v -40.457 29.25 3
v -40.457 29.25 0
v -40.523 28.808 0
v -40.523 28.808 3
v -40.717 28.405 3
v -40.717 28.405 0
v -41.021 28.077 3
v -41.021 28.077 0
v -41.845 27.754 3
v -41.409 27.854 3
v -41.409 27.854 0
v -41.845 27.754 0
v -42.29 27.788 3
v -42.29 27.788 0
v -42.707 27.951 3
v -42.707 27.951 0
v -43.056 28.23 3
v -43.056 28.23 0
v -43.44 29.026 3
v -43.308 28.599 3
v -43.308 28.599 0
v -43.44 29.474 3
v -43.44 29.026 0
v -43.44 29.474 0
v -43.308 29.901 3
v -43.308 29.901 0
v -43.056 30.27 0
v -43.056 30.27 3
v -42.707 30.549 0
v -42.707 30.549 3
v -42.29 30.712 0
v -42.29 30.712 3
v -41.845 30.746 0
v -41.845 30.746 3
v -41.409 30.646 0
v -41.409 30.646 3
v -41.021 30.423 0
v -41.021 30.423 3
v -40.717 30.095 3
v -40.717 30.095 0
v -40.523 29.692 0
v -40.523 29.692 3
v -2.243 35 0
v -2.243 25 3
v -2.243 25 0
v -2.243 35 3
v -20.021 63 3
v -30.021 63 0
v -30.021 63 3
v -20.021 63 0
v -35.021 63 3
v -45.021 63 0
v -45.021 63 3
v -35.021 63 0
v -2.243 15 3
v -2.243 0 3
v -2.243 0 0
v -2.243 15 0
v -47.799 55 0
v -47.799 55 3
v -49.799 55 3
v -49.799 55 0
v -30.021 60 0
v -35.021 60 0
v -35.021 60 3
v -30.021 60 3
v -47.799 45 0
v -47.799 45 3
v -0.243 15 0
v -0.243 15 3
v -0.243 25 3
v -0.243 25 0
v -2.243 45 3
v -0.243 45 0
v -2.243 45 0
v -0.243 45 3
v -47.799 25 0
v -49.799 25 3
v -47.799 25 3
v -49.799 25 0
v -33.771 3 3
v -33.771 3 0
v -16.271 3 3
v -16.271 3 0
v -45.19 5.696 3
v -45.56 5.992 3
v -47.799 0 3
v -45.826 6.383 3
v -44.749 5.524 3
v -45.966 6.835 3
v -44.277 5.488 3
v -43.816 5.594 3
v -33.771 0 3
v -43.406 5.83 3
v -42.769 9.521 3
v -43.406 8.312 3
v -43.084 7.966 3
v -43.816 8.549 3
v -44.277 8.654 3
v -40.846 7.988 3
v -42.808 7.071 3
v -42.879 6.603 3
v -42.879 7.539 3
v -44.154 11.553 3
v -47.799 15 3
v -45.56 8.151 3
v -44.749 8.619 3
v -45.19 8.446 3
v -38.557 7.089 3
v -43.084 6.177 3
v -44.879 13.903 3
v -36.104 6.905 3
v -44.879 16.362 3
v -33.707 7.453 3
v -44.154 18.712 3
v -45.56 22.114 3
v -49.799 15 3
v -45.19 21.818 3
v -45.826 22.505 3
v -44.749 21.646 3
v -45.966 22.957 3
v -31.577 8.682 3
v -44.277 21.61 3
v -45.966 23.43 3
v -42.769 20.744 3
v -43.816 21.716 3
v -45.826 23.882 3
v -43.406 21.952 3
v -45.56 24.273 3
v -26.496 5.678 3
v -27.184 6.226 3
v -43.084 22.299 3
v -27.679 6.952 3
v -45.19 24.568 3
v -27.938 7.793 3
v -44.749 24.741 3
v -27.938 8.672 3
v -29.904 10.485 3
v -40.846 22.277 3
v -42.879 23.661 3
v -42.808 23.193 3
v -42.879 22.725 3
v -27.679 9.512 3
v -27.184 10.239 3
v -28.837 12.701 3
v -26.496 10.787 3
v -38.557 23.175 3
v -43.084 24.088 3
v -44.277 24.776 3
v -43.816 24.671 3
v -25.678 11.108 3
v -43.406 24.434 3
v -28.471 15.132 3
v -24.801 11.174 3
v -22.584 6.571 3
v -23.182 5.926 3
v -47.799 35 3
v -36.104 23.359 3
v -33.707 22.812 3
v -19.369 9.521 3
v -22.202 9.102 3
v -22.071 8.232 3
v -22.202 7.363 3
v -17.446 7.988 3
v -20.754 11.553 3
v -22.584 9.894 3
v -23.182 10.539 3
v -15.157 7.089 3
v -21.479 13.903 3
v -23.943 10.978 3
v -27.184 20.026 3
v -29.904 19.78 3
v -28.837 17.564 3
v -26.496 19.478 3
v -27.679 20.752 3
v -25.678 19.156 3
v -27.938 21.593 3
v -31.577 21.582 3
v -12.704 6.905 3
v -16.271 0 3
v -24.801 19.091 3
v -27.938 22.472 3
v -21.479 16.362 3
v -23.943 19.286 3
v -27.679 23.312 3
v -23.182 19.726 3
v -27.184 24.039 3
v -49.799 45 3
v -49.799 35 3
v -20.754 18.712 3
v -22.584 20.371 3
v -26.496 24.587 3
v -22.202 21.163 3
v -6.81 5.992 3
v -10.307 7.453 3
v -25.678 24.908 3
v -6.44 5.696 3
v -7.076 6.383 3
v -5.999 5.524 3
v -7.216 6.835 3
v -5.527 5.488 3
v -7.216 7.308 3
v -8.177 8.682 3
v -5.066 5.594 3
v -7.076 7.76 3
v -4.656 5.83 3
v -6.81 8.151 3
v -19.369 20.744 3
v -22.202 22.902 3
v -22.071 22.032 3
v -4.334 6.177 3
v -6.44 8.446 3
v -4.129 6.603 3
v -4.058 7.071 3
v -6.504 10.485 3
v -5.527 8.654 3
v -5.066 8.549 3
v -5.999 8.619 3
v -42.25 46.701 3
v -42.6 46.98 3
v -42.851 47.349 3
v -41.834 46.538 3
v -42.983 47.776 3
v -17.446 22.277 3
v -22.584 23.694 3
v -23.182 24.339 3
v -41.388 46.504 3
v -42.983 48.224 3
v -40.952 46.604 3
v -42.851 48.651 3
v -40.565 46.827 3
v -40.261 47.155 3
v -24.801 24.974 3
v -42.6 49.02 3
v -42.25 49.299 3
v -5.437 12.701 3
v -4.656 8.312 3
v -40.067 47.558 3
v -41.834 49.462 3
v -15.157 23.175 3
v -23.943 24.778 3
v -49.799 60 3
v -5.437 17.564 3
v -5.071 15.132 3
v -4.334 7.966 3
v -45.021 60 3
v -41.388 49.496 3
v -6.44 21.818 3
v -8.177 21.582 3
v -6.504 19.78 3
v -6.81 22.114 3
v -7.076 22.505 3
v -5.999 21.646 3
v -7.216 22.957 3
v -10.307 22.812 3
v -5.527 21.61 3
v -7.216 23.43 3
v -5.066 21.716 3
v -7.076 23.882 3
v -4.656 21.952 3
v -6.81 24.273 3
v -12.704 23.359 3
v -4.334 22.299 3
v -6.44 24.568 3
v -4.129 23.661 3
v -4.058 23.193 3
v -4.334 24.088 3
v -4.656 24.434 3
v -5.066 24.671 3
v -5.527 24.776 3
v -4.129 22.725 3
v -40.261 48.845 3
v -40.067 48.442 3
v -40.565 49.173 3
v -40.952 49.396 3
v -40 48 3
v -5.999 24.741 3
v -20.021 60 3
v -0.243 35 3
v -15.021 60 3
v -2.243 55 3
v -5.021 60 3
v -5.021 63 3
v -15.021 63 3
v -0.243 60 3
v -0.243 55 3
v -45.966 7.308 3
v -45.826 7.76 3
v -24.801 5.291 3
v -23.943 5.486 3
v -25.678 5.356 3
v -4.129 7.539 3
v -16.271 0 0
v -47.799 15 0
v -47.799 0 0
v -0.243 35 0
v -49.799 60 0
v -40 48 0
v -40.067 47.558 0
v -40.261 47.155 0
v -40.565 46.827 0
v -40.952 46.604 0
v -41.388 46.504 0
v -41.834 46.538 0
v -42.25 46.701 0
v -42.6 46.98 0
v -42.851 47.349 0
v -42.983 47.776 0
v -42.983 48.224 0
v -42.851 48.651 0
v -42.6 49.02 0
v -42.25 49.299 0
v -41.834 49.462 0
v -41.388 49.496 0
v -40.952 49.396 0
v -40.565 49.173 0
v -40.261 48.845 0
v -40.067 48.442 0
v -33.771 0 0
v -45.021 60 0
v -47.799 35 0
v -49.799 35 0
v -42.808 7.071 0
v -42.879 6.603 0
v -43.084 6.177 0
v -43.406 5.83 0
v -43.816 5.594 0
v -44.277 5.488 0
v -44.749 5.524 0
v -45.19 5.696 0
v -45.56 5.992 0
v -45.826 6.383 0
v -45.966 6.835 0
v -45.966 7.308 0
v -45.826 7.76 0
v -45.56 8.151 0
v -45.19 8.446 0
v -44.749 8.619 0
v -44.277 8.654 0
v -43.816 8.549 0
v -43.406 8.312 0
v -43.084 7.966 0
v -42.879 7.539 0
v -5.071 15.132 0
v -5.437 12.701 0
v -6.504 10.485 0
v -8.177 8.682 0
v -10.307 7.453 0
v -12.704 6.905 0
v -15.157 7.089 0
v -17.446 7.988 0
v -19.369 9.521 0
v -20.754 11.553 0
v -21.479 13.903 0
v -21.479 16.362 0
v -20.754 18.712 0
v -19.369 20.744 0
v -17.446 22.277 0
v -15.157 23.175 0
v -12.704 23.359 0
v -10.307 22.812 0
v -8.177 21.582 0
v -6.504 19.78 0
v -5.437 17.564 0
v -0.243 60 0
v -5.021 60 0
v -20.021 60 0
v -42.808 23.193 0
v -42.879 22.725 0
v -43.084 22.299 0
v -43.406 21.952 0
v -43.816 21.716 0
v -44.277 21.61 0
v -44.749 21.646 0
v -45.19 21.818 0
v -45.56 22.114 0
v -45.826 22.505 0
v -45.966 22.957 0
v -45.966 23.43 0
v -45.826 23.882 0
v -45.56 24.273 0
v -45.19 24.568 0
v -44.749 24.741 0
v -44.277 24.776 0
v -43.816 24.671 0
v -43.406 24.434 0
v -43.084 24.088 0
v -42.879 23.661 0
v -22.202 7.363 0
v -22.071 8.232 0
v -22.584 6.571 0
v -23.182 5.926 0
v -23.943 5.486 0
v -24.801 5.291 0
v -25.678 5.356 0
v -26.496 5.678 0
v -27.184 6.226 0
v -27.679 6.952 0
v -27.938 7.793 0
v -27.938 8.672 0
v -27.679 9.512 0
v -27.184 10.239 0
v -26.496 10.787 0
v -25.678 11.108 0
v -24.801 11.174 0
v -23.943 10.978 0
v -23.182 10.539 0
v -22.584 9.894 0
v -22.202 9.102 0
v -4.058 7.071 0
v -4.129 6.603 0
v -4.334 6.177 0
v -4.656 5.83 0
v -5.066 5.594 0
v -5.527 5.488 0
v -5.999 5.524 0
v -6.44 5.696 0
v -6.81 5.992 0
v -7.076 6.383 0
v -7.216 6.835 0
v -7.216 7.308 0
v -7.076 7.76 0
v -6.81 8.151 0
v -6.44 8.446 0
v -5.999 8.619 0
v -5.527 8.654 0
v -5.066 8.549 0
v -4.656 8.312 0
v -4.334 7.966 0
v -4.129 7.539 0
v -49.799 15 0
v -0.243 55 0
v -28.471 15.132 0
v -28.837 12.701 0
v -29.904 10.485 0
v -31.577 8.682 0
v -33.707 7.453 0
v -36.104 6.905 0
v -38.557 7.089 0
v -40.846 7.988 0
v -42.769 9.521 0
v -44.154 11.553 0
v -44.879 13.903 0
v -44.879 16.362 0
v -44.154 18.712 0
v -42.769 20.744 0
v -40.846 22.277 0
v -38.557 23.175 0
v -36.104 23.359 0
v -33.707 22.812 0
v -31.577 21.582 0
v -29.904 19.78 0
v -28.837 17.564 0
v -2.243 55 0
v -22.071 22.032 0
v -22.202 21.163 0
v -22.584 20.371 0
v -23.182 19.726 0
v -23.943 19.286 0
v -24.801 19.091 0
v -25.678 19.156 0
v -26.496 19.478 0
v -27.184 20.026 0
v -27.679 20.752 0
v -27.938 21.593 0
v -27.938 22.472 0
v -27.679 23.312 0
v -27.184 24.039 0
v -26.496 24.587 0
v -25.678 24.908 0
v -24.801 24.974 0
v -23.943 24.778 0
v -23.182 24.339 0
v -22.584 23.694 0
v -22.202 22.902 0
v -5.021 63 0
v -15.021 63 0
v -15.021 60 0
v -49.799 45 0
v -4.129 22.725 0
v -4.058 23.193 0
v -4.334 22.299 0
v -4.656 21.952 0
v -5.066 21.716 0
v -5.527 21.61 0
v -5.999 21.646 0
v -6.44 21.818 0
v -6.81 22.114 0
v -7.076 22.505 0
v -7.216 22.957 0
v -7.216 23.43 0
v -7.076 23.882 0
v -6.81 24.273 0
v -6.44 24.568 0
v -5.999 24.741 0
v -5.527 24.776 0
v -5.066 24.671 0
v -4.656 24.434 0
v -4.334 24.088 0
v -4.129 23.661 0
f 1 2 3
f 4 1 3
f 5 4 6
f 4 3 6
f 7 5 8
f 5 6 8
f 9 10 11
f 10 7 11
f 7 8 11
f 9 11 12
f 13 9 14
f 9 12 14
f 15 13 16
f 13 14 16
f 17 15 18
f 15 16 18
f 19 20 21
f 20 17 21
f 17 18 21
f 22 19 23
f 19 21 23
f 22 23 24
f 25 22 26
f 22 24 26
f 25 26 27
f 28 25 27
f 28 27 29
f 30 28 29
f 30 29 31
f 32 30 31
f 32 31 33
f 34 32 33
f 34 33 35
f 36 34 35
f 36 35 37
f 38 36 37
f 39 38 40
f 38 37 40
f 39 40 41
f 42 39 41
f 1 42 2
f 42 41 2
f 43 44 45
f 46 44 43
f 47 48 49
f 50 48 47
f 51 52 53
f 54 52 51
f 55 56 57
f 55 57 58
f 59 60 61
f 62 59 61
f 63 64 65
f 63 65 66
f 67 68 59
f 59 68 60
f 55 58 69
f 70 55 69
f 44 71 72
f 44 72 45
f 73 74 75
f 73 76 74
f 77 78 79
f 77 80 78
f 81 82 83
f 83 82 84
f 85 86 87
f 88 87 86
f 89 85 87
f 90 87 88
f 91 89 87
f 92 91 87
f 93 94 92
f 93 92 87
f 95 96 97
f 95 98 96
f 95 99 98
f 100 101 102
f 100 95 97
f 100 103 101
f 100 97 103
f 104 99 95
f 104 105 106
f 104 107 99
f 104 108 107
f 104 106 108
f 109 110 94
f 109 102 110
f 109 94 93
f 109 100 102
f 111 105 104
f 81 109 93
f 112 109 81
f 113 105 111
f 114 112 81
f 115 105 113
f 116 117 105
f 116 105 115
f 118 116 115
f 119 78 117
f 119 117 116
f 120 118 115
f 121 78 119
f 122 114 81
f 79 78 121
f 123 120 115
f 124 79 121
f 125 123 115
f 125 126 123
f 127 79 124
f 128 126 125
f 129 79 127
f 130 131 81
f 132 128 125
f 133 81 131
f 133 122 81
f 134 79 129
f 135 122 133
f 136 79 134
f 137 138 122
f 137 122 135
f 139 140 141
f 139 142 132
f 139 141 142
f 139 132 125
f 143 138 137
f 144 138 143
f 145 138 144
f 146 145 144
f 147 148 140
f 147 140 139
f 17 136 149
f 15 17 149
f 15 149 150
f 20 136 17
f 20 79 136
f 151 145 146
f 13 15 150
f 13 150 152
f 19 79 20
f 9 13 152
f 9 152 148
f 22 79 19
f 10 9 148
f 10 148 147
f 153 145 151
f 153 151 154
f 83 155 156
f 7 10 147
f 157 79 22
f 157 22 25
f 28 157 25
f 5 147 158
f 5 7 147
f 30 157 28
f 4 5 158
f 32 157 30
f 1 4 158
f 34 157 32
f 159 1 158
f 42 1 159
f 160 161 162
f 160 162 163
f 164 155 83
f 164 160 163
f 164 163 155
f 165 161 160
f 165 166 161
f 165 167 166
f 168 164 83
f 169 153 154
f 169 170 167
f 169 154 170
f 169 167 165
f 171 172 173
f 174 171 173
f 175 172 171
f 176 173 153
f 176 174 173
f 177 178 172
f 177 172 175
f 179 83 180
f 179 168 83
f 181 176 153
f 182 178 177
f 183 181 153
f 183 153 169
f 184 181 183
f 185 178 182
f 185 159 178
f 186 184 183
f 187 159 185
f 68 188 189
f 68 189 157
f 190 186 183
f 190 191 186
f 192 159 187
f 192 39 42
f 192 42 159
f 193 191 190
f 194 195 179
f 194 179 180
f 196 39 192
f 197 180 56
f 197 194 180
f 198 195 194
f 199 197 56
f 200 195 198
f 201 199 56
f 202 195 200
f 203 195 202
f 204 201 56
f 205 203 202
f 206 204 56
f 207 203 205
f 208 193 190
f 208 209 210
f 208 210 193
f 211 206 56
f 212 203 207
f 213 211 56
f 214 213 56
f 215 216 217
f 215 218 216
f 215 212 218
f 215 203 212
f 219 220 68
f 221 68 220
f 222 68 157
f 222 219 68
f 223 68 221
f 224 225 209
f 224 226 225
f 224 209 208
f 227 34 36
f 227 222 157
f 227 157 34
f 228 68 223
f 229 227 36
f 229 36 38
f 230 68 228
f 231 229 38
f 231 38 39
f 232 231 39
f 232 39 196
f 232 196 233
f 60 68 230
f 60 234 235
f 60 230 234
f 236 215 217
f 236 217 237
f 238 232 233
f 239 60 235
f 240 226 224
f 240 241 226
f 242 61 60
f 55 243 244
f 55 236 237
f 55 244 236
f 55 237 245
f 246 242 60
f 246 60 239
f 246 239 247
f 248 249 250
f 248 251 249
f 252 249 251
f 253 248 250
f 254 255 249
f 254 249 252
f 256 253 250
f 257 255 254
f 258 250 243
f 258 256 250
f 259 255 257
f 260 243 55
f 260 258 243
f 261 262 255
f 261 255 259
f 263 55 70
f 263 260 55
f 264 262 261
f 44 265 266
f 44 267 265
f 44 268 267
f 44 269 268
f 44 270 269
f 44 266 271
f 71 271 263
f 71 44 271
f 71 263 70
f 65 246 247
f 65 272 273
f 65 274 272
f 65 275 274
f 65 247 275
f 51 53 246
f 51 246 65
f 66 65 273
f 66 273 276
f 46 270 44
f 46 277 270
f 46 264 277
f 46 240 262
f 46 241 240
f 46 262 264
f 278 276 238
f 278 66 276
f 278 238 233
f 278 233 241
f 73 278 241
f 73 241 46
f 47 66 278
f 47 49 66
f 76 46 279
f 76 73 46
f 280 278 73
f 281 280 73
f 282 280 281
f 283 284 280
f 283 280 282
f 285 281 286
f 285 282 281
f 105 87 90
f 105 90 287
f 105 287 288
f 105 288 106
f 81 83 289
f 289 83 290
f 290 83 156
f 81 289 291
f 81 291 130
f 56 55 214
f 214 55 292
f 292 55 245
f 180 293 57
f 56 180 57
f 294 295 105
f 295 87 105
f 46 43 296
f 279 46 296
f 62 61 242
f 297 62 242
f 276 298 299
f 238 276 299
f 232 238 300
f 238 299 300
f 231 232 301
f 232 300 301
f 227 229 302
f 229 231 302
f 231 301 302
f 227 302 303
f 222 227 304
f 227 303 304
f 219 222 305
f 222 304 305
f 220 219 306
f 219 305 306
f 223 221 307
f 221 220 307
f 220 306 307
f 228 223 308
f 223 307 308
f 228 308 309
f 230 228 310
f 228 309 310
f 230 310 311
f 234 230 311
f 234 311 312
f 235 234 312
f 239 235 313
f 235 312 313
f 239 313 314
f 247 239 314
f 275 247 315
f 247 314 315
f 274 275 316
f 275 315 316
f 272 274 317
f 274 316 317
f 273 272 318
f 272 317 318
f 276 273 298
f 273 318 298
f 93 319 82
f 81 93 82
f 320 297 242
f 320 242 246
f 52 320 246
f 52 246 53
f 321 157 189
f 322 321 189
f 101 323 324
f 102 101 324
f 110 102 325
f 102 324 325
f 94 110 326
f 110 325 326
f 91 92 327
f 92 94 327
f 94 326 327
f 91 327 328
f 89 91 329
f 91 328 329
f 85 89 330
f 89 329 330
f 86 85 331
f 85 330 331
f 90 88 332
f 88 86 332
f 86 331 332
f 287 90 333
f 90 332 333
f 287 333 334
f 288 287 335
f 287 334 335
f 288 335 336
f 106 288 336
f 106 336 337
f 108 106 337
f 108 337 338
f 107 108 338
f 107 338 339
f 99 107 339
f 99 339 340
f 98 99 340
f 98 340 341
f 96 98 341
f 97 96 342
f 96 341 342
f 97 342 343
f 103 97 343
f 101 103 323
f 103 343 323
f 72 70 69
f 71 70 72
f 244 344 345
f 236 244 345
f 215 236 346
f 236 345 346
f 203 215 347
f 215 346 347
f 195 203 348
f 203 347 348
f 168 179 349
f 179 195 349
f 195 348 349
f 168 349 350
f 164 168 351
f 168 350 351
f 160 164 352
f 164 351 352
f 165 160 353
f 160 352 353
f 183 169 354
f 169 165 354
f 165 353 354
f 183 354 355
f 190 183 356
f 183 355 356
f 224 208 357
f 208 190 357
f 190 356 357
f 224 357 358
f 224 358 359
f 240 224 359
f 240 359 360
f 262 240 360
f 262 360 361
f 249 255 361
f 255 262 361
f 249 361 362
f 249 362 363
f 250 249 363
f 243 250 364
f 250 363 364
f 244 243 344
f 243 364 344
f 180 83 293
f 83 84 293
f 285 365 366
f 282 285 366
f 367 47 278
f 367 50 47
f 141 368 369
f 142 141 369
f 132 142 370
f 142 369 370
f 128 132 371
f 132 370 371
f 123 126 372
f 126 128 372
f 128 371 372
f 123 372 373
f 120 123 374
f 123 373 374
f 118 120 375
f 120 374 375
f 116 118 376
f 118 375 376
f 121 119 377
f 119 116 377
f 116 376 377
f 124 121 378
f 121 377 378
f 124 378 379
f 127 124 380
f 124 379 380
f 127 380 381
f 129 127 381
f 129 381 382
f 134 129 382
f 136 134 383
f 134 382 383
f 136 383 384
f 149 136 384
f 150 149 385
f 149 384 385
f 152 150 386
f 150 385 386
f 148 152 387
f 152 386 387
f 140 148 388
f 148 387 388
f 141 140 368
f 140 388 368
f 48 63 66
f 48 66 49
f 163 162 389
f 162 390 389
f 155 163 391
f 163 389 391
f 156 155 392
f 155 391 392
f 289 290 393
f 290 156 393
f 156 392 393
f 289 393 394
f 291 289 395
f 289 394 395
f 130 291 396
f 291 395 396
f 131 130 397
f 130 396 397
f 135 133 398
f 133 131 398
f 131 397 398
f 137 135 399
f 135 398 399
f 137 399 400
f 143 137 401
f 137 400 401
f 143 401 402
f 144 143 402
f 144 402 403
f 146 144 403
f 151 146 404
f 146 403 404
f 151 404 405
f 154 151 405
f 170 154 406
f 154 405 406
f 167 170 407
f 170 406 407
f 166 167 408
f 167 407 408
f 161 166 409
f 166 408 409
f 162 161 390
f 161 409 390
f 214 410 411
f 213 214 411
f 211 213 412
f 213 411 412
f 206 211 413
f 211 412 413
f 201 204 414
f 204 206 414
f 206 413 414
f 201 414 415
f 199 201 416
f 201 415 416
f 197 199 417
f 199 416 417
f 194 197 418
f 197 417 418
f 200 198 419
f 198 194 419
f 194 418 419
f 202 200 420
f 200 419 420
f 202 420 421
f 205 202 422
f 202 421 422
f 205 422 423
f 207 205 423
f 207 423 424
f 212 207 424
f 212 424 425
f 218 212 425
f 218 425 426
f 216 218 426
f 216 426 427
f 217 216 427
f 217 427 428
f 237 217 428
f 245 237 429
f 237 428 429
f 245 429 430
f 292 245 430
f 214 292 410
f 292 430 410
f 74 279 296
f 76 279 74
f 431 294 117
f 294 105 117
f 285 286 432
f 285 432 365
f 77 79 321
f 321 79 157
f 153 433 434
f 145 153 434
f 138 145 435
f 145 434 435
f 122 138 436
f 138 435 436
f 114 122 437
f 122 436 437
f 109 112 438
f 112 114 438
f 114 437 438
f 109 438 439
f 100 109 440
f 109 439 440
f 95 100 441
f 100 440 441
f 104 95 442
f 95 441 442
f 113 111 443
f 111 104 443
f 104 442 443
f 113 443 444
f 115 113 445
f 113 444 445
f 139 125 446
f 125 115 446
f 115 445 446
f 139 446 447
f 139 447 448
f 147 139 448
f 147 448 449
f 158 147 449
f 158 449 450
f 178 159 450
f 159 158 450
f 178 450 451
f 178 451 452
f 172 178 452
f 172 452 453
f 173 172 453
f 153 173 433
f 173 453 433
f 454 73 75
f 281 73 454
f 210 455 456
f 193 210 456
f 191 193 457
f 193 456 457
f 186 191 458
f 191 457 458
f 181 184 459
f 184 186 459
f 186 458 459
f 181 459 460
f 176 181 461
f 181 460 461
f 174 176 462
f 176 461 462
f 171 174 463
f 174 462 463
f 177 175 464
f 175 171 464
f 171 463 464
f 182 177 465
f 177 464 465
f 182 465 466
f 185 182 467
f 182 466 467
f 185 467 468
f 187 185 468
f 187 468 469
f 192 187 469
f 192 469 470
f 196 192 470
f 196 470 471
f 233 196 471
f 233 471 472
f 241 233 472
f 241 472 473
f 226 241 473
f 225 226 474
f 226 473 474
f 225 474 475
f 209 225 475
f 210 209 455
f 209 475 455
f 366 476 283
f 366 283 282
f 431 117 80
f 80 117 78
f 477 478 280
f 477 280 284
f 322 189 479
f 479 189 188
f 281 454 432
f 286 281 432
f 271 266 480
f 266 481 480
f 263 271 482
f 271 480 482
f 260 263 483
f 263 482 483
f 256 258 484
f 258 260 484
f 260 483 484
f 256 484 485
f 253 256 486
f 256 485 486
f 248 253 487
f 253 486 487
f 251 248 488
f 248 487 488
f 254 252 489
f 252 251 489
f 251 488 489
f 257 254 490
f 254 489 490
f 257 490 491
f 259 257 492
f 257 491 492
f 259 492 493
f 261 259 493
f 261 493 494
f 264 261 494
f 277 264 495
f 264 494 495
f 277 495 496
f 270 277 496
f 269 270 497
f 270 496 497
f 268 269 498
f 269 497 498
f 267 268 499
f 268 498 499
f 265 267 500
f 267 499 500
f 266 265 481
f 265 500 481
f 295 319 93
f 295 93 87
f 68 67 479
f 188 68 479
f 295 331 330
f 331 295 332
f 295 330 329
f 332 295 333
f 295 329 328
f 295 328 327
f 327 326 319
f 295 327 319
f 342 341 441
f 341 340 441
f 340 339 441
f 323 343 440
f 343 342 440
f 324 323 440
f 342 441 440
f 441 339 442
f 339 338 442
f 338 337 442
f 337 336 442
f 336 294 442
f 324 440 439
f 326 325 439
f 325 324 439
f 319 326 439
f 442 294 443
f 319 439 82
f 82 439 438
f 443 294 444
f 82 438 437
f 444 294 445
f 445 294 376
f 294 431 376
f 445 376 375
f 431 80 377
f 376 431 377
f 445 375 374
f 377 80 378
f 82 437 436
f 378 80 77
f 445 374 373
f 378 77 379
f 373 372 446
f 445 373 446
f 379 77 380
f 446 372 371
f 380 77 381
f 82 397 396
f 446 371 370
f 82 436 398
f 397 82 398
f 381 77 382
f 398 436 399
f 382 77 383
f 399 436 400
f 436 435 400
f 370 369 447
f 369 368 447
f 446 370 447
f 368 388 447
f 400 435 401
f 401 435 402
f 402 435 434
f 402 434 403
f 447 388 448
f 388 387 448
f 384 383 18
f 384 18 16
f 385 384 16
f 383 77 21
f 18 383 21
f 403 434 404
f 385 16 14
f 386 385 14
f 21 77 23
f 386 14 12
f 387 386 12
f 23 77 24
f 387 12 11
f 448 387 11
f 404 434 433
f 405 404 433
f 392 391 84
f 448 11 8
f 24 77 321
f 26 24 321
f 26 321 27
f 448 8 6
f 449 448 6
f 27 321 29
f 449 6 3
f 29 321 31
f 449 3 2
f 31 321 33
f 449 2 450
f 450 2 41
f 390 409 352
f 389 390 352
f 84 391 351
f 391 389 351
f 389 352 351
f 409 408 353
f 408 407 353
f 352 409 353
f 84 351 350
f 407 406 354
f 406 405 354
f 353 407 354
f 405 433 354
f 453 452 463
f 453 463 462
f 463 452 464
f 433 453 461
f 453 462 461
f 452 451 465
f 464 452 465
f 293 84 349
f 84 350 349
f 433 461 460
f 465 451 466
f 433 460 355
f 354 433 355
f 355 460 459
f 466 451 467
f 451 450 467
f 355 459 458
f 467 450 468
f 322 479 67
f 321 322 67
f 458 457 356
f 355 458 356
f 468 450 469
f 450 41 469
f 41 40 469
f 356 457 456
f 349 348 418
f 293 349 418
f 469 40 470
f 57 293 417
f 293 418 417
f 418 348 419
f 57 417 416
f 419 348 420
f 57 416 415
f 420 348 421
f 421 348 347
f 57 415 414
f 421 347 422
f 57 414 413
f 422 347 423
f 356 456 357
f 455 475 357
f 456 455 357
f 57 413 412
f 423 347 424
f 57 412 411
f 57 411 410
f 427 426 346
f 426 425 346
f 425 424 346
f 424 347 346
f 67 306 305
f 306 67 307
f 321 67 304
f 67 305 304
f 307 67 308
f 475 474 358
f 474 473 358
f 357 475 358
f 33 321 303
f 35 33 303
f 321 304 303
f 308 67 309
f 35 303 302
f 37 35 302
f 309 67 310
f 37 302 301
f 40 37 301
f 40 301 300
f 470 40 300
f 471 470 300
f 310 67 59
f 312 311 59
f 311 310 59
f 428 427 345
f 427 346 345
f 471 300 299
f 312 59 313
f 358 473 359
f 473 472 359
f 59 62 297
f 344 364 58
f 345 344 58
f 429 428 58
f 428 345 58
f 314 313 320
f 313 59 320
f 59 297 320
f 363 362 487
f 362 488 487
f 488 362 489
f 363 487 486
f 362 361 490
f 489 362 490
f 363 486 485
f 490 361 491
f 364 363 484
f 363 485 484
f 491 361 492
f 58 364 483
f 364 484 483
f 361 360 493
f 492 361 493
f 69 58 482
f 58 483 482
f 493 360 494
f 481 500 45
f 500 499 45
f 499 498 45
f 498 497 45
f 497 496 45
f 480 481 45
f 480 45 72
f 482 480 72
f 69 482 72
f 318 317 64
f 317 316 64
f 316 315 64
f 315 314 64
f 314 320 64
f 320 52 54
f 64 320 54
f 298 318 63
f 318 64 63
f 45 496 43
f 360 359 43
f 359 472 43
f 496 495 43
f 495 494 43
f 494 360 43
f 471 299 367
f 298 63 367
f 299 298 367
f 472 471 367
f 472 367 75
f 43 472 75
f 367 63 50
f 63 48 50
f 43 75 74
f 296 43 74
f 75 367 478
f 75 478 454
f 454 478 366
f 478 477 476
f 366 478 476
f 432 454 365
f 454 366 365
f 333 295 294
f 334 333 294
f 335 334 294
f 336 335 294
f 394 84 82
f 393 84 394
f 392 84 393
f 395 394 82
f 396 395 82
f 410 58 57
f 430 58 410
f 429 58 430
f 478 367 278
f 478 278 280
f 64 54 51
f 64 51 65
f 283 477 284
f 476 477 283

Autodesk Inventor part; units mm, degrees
ref_plane "YZ Plane" through (0, 0, 0) normal (1, 0, 0) x (0, 1, 0)
ref_plane "XZ Plane" through (0, 0, 0) normal (0, 1, 0) x (-1, 0, 0)
ref_plane "XY Plane" through (0, 0, 0) normal (0, 0, 1) x (1, 0, 0)
sketch "Sketch1" plane through (0, 0, 0) normal (0, 0, 1) x (1, 0, 0)
  line L0 (-16.2709, 3) -> (-16.2709, 0)
  line L1 (-33.7709, 3) -> (-16.2709, 3)
  line L2 (-33.7709, 0) -> (-33.7709, 3)
  line L3 (-33.7709, 0) -> (-48.7992, 0)
  line L4 (-30.0209, 63) -> (-20.0209, 63)
  line L5 (-20.0209, 63) -> (-20.0209, 60)
  line L6 (-30.0209, 60) -> (-30.0209, 63)
  line L7 (-30.0209, 63) -> (-20.0209, 60) construction
  line L8 (-20.0209, 63) -> (-30.0209, 60) construction
  line L9 (-25.4776, 30) -> (-35.4566, 30) construction
  line L10 (-25.0209, 30) -> (-25.0209, 38) construction
  line L11 (-45.0209, 63) -> (-35.0209, 63)
  line L12 (-35.0209, 63) -> (-35.0209, 60)
  line L13 (-45.0209, 60) -> (-45.0209, 63)
  line L14 (-45.0209, 63) -> (-35.0209, 60) construction
  line L15 (-35.0209, 63) -> (-45.0209, 60) construction
  line L16 (-15.0209, 63) -> (-5.0209, 63)
  line L17 (-5.0209, 63) -> (-5.0209, 60)
  line L18 (-15.0209, 60) -> (-15.0209, 63)
  line L19 (-15.0209, 63) -> (-5.0209, 60) construction
  line L20 (-5.0209, 63) -> (-15.0209, 60) construction
  line L21 (-30.0209, 63) -> (-20.0209, 63)
  line L22 (-20.0209, 63) -> (-20.0209, 60)
  line L23 (-30.0209, 60) -> (-30.0209, 63)
  line L24 (-30.0209, 63) -> (-20.0209, 60) construction
  line L25 (-20.0209, 63) -> (-30.0209, 60) construction
  line L26 (-48.7992, 60) -> (-45.0209, 60)
  line L27 (-35.0209, 60) -> (-30.0209, 60)
  line L28 (-20.0209, 60) -> (-15.0209, 60)
  line L29 (-48.7992, 15) -> (-51.799, 15)
  line L30 (-51.799, 15) -> (-51.799, 25)
  line L31 (-51.799, 25) -> (-48.7992, 25)
  line L32 (-48.7992, 35) -> (-51.799, 35)
  line L33 (-51.799, 35) -> (-51.799, 45)
  line L34 (-48.7992, 45) -> (-51.799, 45)
  line L35 (-48.7992, 55) -> (-51.7992, 55)
  line L36 (-48.7992, 55) -> (-45.7992, 55) construction
  line L37 (-51.7992, 55) -> (-51.7992, 60)
  line L38 (-51.7992, 60) -> (-48.7992, 60)
  line L39 (-48.7992, 55) -> (-48.7992, 45)
  line L40 (-48.7992, 35) -> (-48.7992, 25)
  line L41 (-48.7992, 15) -> (-48.7992, 5)
  line L42 (-48.7992, 5) -> (-51.7992, 5)
  line L43 (-51.7992, 5) -> (-51.7992, 0)
  line L44 (-51.7992, 0) -> (-48.7992, 0)
  line L45 (-16.2709, 0) -> (-1.2426, 0)
  line L46 (-1.2426, 60) -> (-5.0209, 60)
  line L47 (-1.2426, 15) -> (1.7572, 15)
  line L48 (1.7572, 15) -> (1.7572, 25)
  line L49 (1.7572, 25) -> (-1.2426, 25)
  line L50 (-1.2426, 35) -> (1.7572, 35)
  line L51 (1.7572, 35) -> (1.7572, 45)
  line L52 (-1.2426, 45) -> (1.7572, 45)
  line L53 (-1.2426, 55) -> (1.7574, 55)
  line L54 (1.7574, 55) -> (1.7574, 60)
  line L55 (1.7574, 60) -> (-1.2426, 60)
  line L56 (-1.2426, 55) -> (-1.2426, 45)
  line L57 (-1.2426, 35) -> (-1.2426, 25)
  line L58 (-1.2426, 15) -> (-1.2426, 5)
  line L59 (-1.2426, 5) -> (1.7574, 5)
  line L60 (1.7574, 5) -> (1.7574, 0)
  line L61 (1.7574, 0) -> (-1.2426, 0)
  circle A0 centre (-44.3959, 23.1933) radius 1.5875
  circle A1 centre (-44.3959, 7.0713) radius 1.5875
  circle A2 centre (-36.7209, 15.1323) radius 8.25
  circle A3 centre (-25.0211, 22.0323) radius 2.95
  circle A4 centre (-25.0211, 8.2323) radius 2.95
  circle A5 centre (-13.3209, 15.1323) radius 8.25
  circle A6 centre (-5.6459, 7.0713) radius 1.5875
  circle A7 centre (-5.6459, 23.1933) radius 1.5875
  circle A8 centre (-41.9566, 29.25) radius 1.5
  circle A9 centre (-41.5, 48) radius 1.5
  line L62 (-5.6459, 7.0713) -> (-44.3959, 23.1933) construction
  line L63 (-44.3959, 23.1933) -> (-5.6459, 23.1933) construction
  line L64 (-5.6459, 23.1933) -> (-44.3959, 7.0713) construction
  point P0 (0, 0)
  point P1 (-25.0209, 61.5)
  point P2 (-40.0209, 61.5)
  point P3 (-10.0209, 61.5)
  point P4 (-25.0209, 61.5)
  point P5 (-48.7992, 30)
  point P6 (-1.2426, 30)
  point P7 (-25.4776, 15.3162)
  point P8 (-25.4776, 15.3162)
  point P9 (-25.4776, 15.3162)
  point P10 (-25.4776, 15.3162)
  point P11 (-25.0209, 3)
  point P12 (-25.0209, 15.1323)
  dimension "d0" = 10
  dimension "d1" = 3
  dimension "d4" = 15
  dimension "d7" = 15
  dimension "d13" = 3
  dimension "d14" = 180
  dimension "d15" = 3
  dimension "d17" = 7.675
  dimension "d18" = 7.675
  dimension "d23" = 2.9998
  dimension "d30" = 11.7002
  dimension "d31" = 11.6998
  dimension "d32" = 7.675
  dimension "d33" = 7.675
  dimension "d34" = 11.6998
  dimension "d35" = 11.7002
  dimension "d45" = 8.061
  dimension "d46" = 8.061
extrude "Extrusion2" add sketch "Sketch1" along normal blind 3
sketch "Sketch2" plane through (0, 0, 3) normal (0, 0, 1) x (1, 0, 0)
  line L0 (-1.2426, 5) -> (-1.2426, 15) projected
  line L1 (-1.2426, 25) -> (-1.2426, 35) projected
  line L2 (-1.2426, 45) -> (-1.2426, 55) projected
  line L3 (-48.7992, 55) -> (-48.7992, 45) projected
  line L4 (-48.7992, 35) -> (-48.7992, 25) projected
  line L5 (-48.7992, 15) -> (-48.7992, 5) projected
  line L6 (-1.2426, 5) -> (-2.2426, 5)
  line L7 (-2.2426, 5) -> (-2.2426, 15)
  line L8 (-2.2426, 15) -> (-1.2426, 15)
  line L9 (-1.2426, 25) -> (-2.2426, 25)
  line L10 (-2.2426, 25) -> (-2.2426, 35)
  line L11 (-2.2426, 35) -> (-1.2426, 35)
  line L12 (-1.2426, 45) -> (-2.2426, 45)
  line L13 (-2.2426, 45) -> (-2.2426, 55)
  line L14 (-2.2426, 55) -> (-1.2426, 55)
  line L15 (-48.7992, 5) -> (-47.7992, 5)
  line L16 (-47.7992, 5) -> (-47.7992, 15)
  line L17 (-47.7992, 15) -> (-48.7992, 15)
  line L18 (-48.7992, 25) -> (-47.7992, 25)
  line L19 (-47.7992, 25) -> (-47.7992, 35)
  line L20 (-47.7992, 35) -> (-48.7992, 35)
  line L21 (-48.7992, 45) -> (-47.7992, 45)
  line L22 (-48.7992, 45) -> (-51.799, 45) projected
  line L23 (-47.7992, 45) -> (-47.7992, 55)
  line L24 (-47.7992, 55) -> (-48.7992, 55)
  point P0 (0, 0)
  dimension "d24" = 1
  dimension "d25" = 1
  dimension "d28" = 1
  dimension "d29" = 1
extrude "Extrusion3" cut sketch "Sketch2" against normal through all
sketch "Sketch3" plane through (0, 0, 3) normal (0, 0, 1) x (1, 0, 0)
  line L0 (1.7574, 60) -> (-5.0209, 60) projected
  line L1 (1.7574, 0) -> (-0.2426, 0)
  line L2 (-0.2426, 0) -> (-0.2426, 60)
  line L3 (-0.2426, 60) -> (1.7574, 60)
  line L4 (1.7574, 60) -> (1.7574, 0)
  line L5 (-45.0209, 60) -> (-51.7992, 60) projected
  line L6 (-51.7992, 0) -> (-49.7992, 0)
  line L7 (-49.7992, 0) -> (-49.7992, 60)
  line L8 (-49.7992, 60) -> (-51.7992, 60)
  line L9 (-51.7992, 60) -> (-51.7992, 0)
  point P0 (0, 0)
  dimension "d47" = 2
  dimension "d48" = 2
extrude "Extrusion4" cut sketch "Sketch3" against normal through all
sketch "Sketch4" plane through (0, 0, 3) normal (0, 0, 1) x (1, 0, 0)
  line L0 (-2.2426, 5) -> (-0.2426, 5)
  line L1 (-0.2426, 5) -> (-0.2426, 0)
  line L2 (-0.2426, 0) -> (-2.2426, 0)
  line L3 (-2.2426, 0) -> (-2.2426, 5)
  line L4 (-47.7992, 5) -> (-49.7992, 5)
  line L5 (-49.7992, 5) -> (-49.7992, 0)
  line L6 (-49.7992, 0) -> (-47.7992, 0)
  line L7 (-47.7992, 0) -> (-47.7992, 5)
  point P0 (0, 0)
extrude "Extrusion5" cut sketch "Sketch4" against normal through all
equation "\"d46\" = d45"
equation "\"d25\" = d24"
equation "\"d28\" = d24"
equation "\"d29\" = d24"
equation "\"d48\" = d47"
properties part number "srf diag kanan"
